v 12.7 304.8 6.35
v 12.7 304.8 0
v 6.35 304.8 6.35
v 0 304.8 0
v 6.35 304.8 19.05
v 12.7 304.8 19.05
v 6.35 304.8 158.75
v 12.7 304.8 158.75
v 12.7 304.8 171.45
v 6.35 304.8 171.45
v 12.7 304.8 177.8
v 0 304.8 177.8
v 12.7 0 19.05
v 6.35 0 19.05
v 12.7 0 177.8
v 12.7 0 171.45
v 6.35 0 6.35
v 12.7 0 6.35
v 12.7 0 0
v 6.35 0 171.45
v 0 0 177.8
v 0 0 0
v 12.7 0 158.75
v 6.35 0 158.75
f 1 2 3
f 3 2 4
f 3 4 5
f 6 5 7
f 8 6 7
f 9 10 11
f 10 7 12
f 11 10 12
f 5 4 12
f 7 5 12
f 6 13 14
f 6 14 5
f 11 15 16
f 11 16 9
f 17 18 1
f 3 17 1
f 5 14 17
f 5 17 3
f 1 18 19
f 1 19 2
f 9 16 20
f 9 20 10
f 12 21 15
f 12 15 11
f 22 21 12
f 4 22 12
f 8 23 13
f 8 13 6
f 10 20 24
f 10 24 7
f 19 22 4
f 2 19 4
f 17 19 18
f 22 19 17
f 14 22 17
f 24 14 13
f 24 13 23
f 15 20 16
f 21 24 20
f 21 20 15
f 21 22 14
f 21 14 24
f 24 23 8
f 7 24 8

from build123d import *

# Parameters (mm, degrees)
F0_W     = 304.8
F0_H     = 177.8
F1_DEPTH = 12.7
F2_W     = 304.8
F2_H     = 12.7
F3_DEPTH = 6.35
F4_W     = 304.8
F4_H     = 12.7
F5_DEPTH = 6.35


with BuildPart() as f1:
    # F0 (on Right) → F1 (new body)
    with BuildSketch(Plane.YZ):
        with Locations((152.4, 88.9)):
            Rectangle(F0_W, F0_H)
    extrude(amount=F1_DEPTH)

    # F2 (on face) → F3 (cut)
    with BuildSketch(Plane.YZ.offset(12.7)):
        with Locations((152.4, 12.7)):
            Rectangle(F2_W, F2_H)
    extrude(amount=-F3_DEPTH, mode=Mode.SUBTRACT)

    # F4 (on face) → F5 (cut)
    with BuildSketch(Plane.YZ.offset(12.7)):
        with Locations((152.4, 165.1)):
            Rectangle(F4_W, F4_H)
    extrude(amount=-F5_DEPTH, mode=Mode.SUBTRACT)


solid = f1.part
